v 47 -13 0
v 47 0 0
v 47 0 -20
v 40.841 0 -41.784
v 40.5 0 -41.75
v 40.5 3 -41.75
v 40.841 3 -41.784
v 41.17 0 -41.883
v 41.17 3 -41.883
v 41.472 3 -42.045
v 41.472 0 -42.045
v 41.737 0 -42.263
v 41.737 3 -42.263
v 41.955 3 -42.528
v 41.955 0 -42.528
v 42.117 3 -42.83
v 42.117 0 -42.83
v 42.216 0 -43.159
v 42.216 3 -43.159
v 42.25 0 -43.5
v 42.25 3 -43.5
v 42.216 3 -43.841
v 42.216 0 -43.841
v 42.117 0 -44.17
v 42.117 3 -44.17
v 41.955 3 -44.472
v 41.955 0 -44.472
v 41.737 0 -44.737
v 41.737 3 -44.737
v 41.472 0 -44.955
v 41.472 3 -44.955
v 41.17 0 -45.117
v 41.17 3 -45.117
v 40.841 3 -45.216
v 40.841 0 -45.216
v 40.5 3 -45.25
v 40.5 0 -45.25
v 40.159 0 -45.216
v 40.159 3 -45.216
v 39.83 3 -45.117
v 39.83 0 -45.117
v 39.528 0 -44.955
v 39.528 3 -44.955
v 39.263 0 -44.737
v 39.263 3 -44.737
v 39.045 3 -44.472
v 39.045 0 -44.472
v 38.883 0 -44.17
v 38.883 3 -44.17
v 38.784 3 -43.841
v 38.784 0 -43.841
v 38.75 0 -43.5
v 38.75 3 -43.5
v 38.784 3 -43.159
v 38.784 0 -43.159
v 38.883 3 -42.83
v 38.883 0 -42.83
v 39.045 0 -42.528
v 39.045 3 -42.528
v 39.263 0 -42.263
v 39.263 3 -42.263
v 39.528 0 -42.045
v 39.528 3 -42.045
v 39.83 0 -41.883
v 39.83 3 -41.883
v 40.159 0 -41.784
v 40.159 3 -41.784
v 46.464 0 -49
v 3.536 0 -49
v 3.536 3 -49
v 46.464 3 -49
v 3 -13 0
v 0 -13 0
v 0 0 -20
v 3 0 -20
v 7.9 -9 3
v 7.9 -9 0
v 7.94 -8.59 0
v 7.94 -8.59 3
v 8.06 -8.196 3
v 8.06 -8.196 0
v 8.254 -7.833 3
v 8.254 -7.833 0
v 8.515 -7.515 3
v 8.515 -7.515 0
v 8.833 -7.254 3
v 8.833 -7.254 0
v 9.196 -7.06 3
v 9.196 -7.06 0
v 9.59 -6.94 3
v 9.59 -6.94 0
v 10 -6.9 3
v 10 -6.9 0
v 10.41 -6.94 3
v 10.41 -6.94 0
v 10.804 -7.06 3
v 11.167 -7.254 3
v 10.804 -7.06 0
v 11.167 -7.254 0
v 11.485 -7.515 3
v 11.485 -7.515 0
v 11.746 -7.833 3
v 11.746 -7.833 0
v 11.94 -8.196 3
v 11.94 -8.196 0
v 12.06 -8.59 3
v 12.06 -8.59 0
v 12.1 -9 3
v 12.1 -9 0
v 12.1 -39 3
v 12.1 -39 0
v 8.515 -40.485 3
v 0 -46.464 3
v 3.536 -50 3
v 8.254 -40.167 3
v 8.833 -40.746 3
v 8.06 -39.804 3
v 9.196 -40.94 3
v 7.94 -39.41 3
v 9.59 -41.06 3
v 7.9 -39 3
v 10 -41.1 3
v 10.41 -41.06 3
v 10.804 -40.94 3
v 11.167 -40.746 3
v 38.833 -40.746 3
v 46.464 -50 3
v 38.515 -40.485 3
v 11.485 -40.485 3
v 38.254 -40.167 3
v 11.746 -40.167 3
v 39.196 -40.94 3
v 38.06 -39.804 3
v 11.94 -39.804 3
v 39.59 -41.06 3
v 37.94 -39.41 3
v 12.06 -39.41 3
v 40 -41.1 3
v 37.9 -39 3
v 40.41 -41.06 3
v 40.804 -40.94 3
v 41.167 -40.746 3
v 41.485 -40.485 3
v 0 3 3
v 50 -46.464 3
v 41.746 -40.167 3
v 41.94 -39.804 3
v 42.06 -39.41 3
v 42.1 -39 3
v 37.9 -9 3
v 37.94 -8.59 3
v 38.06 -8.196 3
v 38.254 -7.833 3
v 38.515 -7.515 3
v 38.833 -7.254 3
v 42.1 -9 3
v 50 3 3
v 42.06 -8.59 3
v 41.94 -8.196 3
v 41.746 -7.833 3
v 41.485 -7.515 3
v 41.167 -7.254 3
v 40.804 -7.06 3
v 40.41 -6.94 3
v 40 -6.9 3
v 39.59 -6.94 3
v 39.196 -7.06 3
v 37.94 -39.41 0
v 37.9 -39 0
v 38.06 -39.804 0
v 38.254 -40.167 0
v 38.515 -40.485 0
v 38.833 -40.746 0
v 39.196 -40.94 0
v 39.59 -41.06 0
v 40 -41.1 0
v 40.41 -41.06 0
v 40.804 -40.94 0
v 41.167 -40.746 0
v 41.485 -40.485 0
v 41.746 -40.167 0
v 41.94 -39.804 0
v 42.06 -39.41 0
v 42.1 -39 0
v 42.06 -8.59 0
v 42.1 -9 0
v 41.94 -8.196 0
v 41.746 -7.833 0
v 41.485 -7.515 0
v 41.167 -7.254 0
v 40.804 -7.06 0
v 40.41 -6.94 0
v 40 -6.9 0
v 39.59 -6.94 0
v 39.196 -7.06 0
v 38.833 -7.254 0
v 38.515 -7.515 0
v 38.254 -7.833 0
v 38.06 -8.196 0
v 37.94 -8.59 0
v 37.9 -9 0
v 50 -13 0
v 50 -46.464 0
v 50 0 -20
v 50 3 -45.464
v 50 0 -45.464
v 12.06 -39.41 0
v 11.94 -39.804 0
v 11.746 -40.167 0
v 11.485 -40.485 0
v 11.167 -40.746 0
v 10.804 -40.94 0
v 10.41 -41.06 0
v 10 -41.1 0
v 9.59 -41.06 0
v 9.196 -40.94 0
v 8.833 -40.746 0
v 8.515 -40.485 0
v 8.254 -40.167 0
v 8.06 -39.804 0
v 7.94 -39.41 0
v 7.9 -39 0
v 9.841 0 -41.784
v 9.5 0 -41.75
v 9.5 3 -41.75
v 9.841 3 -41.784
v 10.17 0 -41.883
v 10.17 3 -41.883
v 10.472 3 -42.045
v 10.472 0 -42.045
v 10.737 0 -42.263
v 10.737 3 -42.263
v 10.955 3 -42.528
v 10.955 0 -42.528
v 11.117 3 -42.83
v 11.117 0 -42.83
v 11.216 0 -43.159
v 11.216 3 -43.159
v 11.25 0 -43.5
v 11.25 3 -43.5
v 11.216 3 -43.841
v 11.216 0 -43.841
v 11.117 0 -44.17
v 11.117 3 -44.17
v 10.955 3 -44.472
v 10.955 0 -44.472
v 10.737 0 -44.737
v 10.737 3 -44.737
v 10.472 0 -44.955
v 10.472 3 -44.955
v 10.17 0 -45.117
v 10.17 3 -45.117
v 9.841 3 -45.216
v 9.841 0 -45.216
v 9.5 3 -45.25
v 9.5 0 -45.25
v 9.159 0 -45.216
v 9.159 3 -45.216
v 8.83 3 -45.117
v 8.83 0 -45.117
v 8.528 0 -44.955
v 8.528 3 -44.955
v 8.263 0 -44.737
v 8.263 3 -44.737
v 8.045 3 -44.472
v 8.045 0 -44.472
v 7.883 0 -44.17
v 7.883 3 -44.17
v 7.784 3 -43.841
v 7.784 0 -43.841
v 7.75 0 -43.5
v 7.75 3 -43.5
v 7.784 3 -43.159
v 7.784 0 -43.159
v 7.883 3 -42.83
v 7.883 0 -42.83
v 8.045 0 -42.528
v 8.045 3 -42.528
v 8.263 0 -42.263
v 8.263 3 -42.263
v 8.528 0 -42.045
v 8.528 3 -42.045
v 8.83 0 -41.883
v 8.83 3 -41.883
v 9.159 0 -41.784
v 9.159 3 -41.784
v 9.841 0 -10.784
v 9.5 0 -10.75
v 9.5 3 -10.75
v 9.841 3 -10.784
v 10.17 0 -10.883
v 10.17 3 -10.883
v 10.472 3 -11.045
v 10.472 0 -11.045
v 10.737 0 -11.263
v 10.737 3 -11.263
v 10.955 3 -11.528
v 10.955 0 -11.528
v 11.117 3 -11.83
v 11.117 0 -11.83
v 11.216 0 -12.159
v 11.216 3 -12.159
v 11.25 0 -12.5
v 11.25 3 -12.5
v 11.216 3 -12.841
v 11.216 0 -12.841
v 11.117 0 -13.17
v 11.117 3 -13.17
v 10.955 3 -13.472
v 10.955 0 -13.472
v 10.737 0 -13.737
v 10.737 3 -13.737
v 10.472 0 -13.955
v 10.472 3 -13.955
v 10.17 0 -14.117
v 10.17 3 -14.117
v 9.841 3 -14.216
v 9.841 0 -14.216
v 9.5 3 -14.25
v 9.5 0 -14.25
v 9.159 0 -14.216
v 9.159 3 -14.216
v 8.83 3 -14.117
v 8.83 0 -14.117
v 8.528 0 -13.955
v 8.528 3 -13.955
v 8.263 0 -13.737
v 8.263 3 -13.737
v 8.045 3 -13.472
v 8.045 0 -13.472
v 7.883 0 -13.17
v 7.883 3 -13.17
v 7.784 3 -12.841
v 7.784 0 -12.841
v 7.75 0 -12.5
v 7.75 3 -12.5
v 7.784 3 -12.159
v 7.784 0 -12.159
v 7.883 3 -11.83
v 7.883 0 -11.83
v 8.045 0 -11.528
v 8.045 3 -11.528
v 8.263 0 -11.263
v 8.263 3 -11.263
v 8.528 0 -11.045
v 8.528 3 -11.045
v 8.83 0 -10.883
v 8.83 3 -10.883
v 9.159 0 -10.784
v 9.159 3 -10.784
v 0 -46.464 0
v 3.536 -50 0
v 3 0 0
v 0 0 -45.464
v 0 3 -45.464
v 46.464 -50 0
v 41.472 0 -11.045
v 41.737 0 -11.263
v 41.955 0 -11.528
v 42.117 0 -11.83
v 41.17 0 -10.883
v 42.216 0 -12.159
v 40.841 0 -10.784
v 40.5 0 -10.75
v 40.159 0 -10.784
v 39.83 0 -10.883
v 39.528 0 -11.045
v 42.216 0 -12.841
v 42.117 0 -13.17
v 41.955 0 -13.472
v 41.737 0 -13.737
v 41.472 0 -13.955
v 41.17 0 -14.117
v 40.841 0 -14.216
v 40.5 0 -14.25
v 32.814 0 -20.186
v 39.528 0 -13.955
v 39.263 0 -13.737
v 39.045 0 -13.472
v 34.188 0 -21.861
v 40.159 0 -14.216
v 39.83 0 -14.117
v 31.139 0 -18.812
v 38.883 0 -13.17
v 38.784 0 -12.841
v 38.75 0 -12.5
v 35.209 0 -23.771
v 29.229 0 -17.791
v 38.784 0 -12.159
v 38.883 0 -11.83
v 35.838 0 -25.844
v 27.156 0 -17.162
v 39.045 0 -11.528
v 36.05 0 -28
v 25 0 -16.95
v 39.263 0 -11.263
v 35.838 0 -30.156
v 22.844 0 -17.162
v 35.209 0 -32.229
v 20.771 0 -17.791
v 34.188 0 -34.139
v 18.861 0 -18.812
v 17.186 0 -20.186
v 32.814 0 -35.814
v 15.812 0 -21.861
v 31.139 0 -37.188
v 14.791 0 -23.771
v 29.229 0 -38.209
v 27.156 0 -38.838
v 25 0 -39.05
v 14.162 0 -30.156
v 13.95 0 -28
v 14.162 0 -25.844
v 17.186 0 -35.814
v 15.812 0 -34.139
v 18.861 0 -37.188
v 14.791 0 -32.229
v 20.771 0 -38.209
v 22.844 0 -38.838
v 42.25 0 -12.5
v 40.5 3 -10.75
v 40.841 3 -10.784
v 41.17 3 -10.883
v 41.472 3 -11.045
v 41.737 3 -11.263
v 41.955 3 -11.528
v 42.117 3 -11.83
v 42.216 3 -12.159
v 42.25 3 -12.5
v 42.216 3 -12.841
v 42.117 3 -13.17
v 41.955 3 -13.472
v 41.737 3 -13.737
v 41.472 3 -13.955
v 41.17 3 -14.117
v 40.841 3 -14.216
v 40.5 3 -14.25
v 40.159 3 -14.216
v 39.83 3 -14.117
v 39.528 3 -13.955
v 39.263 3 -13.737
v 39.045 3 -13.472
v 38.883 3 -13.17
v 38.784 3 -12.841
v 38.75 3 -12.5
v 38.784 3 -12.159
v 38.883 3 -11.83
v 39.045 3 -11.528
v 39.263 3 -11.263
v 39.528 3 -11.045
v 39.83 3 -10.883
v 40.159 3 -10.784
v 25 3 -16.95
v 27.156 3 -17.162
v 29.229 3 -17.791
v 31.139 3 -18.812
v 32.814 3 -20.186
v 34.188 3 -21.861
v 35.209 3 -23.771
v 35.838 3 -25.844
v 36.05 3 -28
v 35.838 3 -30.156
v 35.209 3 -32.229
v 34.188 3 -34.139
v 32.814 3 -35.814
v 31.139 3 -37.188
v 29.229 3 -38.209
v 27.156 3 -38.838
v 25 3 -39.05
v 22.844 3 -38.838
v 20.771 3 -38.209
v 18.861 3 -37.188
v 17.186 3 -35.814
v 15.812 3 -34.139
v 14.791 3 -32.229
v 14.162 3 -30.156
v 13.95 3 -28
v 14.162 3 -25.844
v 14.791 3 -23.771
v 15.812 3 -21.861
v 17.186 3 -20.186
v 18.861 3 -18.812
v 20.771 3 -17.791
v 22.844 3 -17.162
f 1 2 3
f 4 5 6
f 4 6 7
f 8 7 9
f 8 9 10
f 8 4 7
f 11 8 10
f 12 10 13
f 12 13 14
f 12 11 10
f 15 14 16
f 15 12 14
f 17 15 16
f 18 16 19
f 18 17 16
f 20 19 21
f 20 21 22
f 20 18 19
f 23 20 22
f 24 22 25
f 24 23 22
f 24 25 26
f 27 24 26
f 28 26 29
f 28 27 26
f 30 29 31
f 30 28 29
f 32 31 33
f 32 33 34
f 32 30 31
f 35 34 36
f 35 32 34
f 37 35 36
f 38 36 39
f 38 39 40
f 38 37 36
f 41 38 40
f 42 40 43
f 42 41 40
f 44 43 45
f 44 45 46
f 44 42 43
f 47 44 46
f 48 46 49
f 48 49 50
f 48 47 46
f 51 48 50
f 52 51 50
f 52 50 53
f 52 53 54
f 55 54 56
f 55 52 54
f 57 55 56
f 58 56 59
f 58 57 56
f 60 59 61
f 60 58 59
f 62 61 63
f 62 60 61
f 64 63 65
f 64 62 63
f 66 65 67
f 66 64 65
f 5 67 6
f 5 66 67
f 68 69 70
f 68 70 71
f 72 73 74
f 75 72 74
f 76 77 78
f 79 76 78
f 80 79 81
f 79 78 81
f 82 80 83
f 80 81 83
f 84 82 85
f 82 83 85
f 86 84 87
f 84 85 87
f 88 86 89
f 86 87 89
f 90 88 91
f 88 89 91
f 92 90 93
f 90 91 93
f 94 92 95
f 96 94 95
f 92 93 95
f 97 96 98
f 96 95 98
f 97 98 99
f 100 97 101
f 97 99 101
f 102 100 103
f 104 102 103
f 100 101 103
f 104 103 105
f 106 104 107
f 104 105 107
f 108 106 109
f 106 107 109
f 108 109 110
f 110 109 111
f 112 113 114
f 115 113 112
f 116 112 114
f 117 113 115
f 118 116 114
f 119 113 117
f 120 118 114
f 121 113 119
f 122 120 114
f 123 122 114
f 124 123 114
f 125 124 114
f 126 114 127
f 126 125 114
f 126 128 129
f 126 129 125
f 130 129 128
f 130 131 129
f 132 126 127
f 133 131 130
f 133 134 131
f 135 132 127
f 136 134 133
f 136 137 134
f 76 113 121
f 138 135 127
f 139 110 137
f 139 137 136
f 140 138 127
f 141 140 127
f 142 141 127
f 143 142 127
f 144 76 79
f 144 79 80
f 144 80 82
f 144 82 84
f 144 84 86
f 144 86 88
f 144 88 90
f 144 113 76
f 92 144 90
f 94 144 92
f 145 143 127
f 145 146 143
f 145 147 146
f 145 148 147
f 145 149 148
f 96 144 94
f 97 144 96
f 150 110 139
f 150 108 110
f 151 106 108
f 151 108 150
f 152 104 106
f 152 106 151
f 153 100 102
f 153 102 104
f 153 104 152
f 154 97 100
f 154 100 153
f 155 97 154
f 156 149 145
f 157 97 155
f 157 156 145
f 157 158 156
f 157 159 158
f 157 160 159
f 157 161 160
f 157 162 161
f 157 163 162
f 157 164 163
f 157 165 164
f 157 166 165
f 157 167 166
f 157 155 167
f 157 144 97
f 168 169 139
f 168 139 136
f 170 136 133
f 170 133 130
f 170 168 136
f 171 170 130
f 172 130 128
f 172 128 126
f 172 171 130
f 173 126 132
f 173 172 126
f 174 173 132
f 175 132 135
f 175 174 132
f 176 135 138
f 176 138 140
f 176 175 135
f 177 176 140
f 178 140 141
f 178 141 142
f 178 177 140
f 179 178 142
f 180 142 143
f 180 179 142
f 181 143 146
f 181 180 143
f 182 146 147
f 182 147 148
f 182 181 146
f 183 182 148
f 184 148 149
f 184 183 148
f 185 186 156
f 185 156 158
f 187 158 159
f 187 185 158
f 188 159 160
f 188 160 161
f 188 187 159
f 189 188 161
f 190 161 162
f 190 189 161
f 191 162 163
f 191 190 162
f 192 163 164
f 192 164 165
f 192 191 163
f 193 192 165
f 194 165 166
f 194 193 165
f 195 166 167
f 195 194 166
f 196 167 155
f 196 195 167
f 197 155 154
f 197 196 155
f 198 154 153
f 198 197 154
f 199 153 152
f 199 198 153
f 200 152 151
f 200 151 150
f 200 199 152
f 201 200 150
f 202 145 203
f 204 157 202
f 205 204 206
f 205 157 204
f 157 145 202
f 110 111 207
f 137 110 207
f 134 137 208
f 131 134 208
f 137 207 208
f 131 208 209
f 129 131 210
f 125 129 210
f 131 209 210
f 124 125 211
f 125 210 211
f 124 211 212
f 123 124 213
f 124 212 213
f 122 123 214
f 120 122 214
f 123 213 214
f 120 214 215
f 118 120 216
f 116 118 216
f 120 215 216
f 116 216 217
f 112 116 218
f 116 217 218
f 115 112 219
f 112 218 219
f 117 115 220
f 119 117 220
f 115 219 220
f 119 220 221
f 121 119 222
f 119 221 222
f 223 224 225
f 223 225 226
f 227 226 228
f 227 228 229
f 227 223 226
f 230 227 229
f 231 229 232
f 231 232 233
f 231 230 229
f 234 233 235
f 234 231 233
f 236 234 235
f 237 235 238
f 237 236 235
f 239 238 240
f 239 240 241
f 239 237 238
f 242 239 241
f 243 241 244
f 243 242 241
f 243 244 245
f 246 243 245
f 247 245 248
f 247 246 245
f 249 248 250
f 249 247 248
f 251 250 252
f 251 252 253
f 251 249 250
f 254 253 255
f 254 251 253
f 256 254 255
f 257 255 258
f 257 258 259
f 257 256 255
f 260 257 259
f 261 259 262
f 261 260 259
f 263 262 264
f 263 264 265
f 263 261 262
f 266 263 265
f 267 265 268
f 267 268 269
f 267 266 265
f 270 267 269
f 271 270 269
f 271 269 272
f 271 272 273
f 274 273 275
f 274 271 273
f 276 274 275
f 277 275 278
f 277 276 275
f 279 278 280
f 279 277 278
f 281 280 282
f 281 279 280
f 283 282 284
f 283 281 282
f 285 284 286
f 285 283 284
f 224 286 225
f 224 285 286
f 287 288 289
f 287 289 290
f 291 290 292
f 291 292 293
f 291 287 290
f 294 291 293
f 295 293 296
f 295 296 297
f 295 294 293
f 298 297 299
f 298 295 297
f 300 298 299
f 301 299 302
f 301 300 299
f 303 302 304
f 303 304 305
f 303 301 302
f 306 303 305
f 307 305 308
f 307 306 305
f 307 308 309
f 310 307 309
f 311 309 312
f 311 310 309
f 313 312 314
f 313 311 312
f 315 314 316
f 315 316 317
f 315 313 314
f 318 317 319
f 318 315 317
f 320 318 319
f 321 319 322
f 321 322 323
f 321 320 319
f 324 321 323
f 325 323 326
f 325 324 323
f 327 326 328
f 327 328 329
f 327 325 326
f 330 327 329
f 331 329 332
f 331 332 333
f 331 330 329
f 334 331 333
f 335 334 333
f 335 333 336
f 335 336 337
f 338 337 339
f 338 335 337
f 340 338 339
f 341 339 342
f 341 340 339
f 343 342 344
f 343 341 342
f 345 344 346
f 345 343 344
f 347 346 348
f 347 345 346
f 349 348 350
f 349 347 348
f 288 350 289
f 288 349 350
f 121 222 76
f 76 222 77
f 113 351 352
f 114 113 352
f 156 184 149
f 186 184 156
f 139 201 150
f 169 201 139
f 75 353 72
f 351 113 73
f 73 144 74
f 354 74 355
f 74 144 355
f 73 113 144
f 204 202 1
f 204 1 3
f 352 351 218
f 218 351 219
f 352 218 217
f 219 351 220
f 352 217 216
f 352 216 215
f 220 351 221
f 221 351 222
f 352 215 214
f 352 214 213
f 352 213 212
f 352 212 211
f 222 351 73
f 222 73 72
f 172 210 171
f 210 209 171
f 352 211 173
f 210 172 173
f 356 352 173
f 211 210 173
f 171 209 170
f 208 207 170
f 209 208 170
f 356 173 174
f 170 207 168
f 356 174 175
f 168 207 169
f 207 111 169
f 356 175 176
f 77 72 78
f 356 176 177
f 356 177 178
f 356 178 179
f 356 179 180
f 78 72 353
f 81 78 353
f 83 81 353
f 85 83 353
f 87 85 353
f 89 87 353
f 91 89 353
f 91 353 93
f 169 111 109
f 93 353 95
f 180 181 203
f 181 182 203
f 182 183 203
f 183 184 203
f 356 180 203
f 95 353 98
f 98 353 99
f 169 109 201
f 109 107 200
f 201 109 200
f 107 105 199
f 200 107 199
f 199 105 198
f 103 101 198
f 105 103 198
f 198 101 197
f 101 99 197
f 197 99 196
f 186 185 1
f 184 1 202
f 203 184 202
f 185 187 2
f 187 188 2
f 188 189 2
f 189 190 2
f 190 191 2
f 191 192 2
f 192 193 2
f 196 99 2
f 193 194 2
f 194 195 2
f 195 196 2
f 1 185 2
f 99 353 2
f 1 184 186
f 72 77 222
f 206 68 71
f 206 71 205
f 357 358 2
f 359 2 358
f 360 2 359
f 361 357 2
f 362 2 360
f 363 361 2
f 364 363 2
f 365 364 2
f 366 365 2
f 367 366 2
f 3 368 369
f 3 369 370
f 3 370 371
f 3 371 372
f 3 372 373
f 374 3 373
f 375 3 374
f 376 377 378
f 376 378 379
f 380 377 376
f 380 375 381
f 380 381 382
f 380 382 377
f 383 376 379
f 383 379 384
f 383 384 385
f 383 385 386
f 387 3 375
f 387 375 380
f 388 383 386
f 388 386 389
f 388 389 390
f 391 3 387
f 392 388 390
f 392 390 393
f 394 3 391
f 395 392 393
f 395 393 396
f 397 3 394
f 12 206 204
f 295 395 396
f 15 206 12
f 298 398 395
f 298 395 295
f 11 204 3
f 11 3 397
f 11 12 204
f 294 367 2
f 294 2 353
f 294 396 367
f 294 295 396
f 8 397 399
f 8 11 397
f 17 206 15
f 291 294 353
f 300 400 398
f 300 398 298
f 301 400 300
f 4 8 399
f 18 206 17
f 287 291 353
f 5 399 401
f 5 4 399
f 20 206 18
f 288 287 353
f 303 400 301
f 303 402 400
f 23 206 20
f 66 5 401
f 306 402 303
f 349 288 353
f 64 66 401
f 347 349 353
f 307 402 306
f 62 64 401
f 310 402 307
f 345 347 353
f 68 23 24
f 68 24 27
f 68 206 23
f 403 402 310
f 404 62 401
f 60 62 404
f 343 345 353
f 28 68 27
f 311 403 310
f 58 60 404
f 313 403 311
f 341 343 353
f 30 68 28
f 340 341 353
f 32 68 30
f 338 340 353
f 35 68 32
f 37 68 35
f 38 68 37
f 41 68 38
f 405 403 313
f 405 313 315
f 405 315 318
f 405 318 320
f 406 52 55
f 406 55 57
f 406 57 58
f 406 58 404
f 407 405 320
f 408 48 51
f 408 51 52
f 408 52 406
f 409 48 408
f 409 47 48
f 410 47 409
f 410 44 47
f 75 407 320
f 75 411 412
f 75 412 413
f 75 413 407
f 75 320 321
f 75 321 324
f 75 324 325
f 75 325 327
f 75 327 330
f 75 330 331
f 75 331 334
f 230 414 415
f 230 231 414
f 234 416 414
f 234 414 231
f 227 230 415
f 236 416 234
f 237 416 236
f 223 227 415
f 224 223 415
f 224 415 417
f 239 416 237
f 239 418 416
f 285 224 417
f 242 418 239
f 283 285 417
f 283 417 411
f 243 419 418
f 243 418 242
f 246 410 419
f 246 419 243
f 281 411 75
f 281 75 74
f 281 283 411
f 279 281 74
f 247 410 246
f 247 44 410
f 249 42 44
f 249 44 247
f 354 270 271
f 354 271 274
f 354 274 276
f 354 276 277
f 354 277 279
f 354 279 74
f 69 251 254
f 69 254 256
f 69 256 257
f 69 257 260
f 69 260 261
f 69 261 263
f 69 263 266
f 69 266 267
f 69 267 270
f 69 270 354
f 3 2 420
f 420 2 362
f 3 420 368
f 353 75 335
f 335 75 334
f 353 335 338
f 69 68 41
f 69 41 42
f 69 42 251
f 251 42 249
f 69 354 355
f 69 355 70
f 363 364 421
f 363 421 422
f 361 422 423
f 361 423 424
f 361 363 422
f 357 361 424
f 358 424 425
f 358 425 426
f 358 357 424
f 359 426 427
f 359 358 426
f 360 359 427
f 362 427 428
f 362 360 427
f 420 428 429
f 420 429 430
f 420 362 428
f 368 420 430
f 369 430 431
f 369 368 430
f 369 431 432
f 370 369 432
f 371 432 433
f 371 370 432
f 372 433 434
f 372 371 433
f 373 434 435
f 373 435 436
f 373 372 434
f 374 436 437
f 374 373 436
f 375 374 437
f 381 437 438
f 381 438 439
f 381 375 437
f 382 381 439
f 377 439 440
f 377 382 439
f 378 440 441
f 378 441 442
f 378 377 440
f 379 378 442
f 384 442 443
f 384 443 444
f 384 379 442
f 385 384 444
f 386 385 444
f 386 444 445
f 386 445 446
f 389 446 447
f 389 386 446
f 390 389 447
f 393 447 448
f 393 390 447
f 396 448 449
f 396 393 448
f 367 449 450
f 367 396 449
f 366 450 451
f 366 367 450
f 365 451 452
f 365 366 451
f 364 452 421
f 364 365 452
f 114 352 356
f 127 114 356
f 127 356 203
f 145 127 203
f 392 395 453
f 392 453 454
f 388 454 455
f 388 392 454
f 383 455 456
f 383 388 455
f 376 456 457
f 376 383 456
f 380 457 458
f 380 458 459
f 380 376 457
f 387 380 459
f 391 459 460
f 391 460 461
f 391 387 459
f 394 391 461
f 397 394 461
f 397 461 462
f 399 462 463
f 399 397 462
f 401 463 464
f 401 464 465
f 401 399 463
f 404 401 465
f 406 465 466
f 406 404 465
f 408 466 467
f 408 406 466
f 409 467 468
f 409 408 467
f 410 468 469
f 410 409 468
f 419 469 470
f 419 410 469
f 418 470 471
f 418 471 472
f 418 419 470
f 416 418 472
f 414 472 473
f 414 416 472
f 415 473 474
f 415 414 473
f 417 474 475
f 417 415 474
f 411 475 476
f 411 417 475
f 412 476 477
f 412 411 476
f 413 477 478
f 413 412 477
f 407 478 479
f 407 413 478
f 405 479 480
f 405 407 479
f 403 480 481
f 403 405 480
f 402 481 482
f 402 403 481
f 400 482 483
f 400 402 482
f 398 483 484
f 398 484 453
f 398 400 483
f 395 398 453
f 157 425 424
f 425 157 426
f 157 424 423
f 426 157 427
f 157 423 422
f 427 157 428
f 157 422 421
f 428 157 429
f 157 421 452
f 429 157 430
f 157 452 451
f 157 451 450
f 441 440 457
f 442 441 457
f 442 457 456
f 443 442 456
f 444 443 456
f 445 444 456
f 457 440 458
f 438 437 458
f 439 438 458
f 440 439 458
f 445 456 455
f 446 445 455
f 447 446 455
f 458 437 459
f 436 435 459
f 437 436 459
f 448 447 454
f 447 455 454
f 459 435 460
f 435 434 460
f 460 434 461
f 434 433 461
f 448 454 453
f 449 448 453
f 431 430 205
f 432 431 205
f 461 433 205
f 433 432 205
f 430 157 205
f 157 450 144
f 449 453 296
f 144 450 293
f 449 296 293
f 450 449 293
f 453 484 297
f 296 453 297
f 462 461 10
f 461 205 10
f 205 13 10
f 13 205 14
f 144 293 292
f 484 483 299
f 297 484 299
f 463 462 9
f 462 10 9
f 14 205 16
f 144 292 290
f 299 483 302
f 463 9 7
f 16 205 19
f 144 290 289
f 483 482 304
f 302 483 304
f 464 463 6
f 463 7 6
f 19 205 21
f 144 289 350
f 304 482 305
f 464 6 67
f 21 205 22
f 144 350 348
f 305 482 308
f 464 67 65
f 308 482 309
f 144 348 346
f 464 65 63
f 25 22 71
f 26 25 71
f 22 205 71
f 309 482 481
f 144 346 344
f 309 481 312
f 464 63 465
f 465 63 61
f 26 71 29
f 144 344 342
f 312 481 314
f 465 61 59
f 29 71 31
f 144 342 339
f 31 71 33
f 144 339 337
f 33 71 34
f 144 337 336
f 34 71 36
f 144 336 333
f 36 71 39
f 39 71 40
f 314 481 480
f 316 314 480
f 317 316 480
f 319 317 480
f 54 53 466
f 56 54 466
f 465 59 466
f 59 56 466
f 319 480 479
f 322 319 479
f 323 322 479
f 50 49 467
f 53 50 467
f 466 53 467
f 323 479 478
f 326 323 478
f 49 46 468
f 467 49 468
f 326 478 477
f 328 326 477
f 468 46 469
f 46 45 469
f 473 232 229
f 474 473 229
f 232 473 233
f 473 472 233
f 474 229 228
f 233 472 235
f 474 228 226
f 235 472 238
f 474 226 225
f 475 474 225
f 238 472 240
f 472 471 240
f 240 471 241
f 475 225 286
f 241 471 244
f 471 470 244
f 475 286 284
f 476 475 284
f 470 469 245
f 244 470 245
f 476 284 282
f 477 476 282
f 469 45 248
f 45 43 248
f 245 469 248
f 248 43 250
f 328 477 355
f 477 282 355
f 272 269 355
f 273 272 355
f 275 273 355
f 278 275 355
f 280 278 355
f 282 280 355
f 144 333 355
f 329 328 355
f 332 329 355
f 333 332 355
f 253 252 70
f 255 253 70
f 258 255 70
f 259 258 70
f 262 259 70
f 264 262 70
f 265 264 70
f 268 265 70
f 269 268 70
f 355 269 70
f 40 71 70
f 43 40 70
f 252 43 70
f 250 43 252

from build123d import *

# Parameters (mm, degrees)
SKETCH_1_R      = 11.05
SKETCH_1_R_2    = 1.75
EXTRUDE_1_DEPTH = 3
EXTRUDE_2_DEPTH = 3
EXTRUDE_3_DEPTH = 3
EXTRUDE_4_DEPTH = 3


with BuildPart() as part:
    # 草图1 → 凸台-拉伸1 (new body)
    with BuildSketch(Plane(origin=(0, 0, 0), x_dir=(1, 0, 0), z_dir=(0, 1, 0))):
        Polygon((0, 0), (0, 45.464466094), (3.535533906, 49), (46.464466094, 49), (50, 45.464466094), (50, 0), align=None)
        with Locations(Location((25, 28, 0), (0, 0, 270))):
            Circle(SKETCH_1_R, mode=Mode.SUBTRACT)
        with Locations(Location((9.5, 12.5, 0), (0, 0, 270))):
            Circle(SKETCH_1_R_2, mode=Mode.SUBTRACT)
        with Locations(Location((9.5, 43.5, 0), (0, 0, 270))):
            Circle(SKETCH_1_R_2, mode=Mode.SUBTRACT)
        with Locations(Location((40.5, 43.5, 0), (0, 0, 270))):
            Circle(SKETCH_1_R_2, mode=Mode.SUBTRACT)
        with Locations(Location((40.5, 12.5, 0), (0, 0, 270))):
            Circle(SKETCH_1_R_2, mode=Mode.SUBTRACT)
    extrude(amount=EXTRUDE_1_DEPTH)

    # 草图2 → 凸台-拉伸2 (add)
    with BuildSketch(Plane.XY):
        Polygon((0, 3), (0, -46.464466094), (3.535533906, -50), (46.464466094, -50), (50, -46.464466094), (50, 3), align=None)
        with BuildLine():
            Line((12.1, -9), (12.1, -39))
            ThreePointArc((12.1, -39), (10, -41.1), (7.9, -39))
            Line((7.9, -39), (7.9, -9))
            ThreePointArc((7.9, -9), (10, -6.9), (12.1, -9))
        make_face(mode=Mode.SUBTRACT)
        with BuildLine():
            Line((37.9, -9), (37.9, -39))
            ThreePointArc((37.9, -39), (40, -41.1), (42.1, -39))
            Line((42.1, -39), (42.1, -9))
            ThreePointArc((42.1, -9), (40, -6.9), (37.9, -9))
        make_face(mode=Mode.SUBTRACT)
    extrude(amount=EXTRUDE_2_DEPTH)

    # 草图3 → 凸台-拉伸3 (add)
    with BuildSketch(Plane(origin=(50, 0, 0), x_dir=(0, 0, -1), z_dir=(1, 0, 0))):
        Polygon((0, 0), (0, -13), (20, 0), align=None)
    extrude(amount=-EXTRUDE_3_DEPTH)

    # 草图4 → 凸台-拉伸4 (add)
    with BuildSketch(Plane.ZY):
        Polygon((-20, 0), (0, 0), (0, -13), align=None)
    extrude(amount=-EXTRUDE_4_DEPTH)


solid = part.part
